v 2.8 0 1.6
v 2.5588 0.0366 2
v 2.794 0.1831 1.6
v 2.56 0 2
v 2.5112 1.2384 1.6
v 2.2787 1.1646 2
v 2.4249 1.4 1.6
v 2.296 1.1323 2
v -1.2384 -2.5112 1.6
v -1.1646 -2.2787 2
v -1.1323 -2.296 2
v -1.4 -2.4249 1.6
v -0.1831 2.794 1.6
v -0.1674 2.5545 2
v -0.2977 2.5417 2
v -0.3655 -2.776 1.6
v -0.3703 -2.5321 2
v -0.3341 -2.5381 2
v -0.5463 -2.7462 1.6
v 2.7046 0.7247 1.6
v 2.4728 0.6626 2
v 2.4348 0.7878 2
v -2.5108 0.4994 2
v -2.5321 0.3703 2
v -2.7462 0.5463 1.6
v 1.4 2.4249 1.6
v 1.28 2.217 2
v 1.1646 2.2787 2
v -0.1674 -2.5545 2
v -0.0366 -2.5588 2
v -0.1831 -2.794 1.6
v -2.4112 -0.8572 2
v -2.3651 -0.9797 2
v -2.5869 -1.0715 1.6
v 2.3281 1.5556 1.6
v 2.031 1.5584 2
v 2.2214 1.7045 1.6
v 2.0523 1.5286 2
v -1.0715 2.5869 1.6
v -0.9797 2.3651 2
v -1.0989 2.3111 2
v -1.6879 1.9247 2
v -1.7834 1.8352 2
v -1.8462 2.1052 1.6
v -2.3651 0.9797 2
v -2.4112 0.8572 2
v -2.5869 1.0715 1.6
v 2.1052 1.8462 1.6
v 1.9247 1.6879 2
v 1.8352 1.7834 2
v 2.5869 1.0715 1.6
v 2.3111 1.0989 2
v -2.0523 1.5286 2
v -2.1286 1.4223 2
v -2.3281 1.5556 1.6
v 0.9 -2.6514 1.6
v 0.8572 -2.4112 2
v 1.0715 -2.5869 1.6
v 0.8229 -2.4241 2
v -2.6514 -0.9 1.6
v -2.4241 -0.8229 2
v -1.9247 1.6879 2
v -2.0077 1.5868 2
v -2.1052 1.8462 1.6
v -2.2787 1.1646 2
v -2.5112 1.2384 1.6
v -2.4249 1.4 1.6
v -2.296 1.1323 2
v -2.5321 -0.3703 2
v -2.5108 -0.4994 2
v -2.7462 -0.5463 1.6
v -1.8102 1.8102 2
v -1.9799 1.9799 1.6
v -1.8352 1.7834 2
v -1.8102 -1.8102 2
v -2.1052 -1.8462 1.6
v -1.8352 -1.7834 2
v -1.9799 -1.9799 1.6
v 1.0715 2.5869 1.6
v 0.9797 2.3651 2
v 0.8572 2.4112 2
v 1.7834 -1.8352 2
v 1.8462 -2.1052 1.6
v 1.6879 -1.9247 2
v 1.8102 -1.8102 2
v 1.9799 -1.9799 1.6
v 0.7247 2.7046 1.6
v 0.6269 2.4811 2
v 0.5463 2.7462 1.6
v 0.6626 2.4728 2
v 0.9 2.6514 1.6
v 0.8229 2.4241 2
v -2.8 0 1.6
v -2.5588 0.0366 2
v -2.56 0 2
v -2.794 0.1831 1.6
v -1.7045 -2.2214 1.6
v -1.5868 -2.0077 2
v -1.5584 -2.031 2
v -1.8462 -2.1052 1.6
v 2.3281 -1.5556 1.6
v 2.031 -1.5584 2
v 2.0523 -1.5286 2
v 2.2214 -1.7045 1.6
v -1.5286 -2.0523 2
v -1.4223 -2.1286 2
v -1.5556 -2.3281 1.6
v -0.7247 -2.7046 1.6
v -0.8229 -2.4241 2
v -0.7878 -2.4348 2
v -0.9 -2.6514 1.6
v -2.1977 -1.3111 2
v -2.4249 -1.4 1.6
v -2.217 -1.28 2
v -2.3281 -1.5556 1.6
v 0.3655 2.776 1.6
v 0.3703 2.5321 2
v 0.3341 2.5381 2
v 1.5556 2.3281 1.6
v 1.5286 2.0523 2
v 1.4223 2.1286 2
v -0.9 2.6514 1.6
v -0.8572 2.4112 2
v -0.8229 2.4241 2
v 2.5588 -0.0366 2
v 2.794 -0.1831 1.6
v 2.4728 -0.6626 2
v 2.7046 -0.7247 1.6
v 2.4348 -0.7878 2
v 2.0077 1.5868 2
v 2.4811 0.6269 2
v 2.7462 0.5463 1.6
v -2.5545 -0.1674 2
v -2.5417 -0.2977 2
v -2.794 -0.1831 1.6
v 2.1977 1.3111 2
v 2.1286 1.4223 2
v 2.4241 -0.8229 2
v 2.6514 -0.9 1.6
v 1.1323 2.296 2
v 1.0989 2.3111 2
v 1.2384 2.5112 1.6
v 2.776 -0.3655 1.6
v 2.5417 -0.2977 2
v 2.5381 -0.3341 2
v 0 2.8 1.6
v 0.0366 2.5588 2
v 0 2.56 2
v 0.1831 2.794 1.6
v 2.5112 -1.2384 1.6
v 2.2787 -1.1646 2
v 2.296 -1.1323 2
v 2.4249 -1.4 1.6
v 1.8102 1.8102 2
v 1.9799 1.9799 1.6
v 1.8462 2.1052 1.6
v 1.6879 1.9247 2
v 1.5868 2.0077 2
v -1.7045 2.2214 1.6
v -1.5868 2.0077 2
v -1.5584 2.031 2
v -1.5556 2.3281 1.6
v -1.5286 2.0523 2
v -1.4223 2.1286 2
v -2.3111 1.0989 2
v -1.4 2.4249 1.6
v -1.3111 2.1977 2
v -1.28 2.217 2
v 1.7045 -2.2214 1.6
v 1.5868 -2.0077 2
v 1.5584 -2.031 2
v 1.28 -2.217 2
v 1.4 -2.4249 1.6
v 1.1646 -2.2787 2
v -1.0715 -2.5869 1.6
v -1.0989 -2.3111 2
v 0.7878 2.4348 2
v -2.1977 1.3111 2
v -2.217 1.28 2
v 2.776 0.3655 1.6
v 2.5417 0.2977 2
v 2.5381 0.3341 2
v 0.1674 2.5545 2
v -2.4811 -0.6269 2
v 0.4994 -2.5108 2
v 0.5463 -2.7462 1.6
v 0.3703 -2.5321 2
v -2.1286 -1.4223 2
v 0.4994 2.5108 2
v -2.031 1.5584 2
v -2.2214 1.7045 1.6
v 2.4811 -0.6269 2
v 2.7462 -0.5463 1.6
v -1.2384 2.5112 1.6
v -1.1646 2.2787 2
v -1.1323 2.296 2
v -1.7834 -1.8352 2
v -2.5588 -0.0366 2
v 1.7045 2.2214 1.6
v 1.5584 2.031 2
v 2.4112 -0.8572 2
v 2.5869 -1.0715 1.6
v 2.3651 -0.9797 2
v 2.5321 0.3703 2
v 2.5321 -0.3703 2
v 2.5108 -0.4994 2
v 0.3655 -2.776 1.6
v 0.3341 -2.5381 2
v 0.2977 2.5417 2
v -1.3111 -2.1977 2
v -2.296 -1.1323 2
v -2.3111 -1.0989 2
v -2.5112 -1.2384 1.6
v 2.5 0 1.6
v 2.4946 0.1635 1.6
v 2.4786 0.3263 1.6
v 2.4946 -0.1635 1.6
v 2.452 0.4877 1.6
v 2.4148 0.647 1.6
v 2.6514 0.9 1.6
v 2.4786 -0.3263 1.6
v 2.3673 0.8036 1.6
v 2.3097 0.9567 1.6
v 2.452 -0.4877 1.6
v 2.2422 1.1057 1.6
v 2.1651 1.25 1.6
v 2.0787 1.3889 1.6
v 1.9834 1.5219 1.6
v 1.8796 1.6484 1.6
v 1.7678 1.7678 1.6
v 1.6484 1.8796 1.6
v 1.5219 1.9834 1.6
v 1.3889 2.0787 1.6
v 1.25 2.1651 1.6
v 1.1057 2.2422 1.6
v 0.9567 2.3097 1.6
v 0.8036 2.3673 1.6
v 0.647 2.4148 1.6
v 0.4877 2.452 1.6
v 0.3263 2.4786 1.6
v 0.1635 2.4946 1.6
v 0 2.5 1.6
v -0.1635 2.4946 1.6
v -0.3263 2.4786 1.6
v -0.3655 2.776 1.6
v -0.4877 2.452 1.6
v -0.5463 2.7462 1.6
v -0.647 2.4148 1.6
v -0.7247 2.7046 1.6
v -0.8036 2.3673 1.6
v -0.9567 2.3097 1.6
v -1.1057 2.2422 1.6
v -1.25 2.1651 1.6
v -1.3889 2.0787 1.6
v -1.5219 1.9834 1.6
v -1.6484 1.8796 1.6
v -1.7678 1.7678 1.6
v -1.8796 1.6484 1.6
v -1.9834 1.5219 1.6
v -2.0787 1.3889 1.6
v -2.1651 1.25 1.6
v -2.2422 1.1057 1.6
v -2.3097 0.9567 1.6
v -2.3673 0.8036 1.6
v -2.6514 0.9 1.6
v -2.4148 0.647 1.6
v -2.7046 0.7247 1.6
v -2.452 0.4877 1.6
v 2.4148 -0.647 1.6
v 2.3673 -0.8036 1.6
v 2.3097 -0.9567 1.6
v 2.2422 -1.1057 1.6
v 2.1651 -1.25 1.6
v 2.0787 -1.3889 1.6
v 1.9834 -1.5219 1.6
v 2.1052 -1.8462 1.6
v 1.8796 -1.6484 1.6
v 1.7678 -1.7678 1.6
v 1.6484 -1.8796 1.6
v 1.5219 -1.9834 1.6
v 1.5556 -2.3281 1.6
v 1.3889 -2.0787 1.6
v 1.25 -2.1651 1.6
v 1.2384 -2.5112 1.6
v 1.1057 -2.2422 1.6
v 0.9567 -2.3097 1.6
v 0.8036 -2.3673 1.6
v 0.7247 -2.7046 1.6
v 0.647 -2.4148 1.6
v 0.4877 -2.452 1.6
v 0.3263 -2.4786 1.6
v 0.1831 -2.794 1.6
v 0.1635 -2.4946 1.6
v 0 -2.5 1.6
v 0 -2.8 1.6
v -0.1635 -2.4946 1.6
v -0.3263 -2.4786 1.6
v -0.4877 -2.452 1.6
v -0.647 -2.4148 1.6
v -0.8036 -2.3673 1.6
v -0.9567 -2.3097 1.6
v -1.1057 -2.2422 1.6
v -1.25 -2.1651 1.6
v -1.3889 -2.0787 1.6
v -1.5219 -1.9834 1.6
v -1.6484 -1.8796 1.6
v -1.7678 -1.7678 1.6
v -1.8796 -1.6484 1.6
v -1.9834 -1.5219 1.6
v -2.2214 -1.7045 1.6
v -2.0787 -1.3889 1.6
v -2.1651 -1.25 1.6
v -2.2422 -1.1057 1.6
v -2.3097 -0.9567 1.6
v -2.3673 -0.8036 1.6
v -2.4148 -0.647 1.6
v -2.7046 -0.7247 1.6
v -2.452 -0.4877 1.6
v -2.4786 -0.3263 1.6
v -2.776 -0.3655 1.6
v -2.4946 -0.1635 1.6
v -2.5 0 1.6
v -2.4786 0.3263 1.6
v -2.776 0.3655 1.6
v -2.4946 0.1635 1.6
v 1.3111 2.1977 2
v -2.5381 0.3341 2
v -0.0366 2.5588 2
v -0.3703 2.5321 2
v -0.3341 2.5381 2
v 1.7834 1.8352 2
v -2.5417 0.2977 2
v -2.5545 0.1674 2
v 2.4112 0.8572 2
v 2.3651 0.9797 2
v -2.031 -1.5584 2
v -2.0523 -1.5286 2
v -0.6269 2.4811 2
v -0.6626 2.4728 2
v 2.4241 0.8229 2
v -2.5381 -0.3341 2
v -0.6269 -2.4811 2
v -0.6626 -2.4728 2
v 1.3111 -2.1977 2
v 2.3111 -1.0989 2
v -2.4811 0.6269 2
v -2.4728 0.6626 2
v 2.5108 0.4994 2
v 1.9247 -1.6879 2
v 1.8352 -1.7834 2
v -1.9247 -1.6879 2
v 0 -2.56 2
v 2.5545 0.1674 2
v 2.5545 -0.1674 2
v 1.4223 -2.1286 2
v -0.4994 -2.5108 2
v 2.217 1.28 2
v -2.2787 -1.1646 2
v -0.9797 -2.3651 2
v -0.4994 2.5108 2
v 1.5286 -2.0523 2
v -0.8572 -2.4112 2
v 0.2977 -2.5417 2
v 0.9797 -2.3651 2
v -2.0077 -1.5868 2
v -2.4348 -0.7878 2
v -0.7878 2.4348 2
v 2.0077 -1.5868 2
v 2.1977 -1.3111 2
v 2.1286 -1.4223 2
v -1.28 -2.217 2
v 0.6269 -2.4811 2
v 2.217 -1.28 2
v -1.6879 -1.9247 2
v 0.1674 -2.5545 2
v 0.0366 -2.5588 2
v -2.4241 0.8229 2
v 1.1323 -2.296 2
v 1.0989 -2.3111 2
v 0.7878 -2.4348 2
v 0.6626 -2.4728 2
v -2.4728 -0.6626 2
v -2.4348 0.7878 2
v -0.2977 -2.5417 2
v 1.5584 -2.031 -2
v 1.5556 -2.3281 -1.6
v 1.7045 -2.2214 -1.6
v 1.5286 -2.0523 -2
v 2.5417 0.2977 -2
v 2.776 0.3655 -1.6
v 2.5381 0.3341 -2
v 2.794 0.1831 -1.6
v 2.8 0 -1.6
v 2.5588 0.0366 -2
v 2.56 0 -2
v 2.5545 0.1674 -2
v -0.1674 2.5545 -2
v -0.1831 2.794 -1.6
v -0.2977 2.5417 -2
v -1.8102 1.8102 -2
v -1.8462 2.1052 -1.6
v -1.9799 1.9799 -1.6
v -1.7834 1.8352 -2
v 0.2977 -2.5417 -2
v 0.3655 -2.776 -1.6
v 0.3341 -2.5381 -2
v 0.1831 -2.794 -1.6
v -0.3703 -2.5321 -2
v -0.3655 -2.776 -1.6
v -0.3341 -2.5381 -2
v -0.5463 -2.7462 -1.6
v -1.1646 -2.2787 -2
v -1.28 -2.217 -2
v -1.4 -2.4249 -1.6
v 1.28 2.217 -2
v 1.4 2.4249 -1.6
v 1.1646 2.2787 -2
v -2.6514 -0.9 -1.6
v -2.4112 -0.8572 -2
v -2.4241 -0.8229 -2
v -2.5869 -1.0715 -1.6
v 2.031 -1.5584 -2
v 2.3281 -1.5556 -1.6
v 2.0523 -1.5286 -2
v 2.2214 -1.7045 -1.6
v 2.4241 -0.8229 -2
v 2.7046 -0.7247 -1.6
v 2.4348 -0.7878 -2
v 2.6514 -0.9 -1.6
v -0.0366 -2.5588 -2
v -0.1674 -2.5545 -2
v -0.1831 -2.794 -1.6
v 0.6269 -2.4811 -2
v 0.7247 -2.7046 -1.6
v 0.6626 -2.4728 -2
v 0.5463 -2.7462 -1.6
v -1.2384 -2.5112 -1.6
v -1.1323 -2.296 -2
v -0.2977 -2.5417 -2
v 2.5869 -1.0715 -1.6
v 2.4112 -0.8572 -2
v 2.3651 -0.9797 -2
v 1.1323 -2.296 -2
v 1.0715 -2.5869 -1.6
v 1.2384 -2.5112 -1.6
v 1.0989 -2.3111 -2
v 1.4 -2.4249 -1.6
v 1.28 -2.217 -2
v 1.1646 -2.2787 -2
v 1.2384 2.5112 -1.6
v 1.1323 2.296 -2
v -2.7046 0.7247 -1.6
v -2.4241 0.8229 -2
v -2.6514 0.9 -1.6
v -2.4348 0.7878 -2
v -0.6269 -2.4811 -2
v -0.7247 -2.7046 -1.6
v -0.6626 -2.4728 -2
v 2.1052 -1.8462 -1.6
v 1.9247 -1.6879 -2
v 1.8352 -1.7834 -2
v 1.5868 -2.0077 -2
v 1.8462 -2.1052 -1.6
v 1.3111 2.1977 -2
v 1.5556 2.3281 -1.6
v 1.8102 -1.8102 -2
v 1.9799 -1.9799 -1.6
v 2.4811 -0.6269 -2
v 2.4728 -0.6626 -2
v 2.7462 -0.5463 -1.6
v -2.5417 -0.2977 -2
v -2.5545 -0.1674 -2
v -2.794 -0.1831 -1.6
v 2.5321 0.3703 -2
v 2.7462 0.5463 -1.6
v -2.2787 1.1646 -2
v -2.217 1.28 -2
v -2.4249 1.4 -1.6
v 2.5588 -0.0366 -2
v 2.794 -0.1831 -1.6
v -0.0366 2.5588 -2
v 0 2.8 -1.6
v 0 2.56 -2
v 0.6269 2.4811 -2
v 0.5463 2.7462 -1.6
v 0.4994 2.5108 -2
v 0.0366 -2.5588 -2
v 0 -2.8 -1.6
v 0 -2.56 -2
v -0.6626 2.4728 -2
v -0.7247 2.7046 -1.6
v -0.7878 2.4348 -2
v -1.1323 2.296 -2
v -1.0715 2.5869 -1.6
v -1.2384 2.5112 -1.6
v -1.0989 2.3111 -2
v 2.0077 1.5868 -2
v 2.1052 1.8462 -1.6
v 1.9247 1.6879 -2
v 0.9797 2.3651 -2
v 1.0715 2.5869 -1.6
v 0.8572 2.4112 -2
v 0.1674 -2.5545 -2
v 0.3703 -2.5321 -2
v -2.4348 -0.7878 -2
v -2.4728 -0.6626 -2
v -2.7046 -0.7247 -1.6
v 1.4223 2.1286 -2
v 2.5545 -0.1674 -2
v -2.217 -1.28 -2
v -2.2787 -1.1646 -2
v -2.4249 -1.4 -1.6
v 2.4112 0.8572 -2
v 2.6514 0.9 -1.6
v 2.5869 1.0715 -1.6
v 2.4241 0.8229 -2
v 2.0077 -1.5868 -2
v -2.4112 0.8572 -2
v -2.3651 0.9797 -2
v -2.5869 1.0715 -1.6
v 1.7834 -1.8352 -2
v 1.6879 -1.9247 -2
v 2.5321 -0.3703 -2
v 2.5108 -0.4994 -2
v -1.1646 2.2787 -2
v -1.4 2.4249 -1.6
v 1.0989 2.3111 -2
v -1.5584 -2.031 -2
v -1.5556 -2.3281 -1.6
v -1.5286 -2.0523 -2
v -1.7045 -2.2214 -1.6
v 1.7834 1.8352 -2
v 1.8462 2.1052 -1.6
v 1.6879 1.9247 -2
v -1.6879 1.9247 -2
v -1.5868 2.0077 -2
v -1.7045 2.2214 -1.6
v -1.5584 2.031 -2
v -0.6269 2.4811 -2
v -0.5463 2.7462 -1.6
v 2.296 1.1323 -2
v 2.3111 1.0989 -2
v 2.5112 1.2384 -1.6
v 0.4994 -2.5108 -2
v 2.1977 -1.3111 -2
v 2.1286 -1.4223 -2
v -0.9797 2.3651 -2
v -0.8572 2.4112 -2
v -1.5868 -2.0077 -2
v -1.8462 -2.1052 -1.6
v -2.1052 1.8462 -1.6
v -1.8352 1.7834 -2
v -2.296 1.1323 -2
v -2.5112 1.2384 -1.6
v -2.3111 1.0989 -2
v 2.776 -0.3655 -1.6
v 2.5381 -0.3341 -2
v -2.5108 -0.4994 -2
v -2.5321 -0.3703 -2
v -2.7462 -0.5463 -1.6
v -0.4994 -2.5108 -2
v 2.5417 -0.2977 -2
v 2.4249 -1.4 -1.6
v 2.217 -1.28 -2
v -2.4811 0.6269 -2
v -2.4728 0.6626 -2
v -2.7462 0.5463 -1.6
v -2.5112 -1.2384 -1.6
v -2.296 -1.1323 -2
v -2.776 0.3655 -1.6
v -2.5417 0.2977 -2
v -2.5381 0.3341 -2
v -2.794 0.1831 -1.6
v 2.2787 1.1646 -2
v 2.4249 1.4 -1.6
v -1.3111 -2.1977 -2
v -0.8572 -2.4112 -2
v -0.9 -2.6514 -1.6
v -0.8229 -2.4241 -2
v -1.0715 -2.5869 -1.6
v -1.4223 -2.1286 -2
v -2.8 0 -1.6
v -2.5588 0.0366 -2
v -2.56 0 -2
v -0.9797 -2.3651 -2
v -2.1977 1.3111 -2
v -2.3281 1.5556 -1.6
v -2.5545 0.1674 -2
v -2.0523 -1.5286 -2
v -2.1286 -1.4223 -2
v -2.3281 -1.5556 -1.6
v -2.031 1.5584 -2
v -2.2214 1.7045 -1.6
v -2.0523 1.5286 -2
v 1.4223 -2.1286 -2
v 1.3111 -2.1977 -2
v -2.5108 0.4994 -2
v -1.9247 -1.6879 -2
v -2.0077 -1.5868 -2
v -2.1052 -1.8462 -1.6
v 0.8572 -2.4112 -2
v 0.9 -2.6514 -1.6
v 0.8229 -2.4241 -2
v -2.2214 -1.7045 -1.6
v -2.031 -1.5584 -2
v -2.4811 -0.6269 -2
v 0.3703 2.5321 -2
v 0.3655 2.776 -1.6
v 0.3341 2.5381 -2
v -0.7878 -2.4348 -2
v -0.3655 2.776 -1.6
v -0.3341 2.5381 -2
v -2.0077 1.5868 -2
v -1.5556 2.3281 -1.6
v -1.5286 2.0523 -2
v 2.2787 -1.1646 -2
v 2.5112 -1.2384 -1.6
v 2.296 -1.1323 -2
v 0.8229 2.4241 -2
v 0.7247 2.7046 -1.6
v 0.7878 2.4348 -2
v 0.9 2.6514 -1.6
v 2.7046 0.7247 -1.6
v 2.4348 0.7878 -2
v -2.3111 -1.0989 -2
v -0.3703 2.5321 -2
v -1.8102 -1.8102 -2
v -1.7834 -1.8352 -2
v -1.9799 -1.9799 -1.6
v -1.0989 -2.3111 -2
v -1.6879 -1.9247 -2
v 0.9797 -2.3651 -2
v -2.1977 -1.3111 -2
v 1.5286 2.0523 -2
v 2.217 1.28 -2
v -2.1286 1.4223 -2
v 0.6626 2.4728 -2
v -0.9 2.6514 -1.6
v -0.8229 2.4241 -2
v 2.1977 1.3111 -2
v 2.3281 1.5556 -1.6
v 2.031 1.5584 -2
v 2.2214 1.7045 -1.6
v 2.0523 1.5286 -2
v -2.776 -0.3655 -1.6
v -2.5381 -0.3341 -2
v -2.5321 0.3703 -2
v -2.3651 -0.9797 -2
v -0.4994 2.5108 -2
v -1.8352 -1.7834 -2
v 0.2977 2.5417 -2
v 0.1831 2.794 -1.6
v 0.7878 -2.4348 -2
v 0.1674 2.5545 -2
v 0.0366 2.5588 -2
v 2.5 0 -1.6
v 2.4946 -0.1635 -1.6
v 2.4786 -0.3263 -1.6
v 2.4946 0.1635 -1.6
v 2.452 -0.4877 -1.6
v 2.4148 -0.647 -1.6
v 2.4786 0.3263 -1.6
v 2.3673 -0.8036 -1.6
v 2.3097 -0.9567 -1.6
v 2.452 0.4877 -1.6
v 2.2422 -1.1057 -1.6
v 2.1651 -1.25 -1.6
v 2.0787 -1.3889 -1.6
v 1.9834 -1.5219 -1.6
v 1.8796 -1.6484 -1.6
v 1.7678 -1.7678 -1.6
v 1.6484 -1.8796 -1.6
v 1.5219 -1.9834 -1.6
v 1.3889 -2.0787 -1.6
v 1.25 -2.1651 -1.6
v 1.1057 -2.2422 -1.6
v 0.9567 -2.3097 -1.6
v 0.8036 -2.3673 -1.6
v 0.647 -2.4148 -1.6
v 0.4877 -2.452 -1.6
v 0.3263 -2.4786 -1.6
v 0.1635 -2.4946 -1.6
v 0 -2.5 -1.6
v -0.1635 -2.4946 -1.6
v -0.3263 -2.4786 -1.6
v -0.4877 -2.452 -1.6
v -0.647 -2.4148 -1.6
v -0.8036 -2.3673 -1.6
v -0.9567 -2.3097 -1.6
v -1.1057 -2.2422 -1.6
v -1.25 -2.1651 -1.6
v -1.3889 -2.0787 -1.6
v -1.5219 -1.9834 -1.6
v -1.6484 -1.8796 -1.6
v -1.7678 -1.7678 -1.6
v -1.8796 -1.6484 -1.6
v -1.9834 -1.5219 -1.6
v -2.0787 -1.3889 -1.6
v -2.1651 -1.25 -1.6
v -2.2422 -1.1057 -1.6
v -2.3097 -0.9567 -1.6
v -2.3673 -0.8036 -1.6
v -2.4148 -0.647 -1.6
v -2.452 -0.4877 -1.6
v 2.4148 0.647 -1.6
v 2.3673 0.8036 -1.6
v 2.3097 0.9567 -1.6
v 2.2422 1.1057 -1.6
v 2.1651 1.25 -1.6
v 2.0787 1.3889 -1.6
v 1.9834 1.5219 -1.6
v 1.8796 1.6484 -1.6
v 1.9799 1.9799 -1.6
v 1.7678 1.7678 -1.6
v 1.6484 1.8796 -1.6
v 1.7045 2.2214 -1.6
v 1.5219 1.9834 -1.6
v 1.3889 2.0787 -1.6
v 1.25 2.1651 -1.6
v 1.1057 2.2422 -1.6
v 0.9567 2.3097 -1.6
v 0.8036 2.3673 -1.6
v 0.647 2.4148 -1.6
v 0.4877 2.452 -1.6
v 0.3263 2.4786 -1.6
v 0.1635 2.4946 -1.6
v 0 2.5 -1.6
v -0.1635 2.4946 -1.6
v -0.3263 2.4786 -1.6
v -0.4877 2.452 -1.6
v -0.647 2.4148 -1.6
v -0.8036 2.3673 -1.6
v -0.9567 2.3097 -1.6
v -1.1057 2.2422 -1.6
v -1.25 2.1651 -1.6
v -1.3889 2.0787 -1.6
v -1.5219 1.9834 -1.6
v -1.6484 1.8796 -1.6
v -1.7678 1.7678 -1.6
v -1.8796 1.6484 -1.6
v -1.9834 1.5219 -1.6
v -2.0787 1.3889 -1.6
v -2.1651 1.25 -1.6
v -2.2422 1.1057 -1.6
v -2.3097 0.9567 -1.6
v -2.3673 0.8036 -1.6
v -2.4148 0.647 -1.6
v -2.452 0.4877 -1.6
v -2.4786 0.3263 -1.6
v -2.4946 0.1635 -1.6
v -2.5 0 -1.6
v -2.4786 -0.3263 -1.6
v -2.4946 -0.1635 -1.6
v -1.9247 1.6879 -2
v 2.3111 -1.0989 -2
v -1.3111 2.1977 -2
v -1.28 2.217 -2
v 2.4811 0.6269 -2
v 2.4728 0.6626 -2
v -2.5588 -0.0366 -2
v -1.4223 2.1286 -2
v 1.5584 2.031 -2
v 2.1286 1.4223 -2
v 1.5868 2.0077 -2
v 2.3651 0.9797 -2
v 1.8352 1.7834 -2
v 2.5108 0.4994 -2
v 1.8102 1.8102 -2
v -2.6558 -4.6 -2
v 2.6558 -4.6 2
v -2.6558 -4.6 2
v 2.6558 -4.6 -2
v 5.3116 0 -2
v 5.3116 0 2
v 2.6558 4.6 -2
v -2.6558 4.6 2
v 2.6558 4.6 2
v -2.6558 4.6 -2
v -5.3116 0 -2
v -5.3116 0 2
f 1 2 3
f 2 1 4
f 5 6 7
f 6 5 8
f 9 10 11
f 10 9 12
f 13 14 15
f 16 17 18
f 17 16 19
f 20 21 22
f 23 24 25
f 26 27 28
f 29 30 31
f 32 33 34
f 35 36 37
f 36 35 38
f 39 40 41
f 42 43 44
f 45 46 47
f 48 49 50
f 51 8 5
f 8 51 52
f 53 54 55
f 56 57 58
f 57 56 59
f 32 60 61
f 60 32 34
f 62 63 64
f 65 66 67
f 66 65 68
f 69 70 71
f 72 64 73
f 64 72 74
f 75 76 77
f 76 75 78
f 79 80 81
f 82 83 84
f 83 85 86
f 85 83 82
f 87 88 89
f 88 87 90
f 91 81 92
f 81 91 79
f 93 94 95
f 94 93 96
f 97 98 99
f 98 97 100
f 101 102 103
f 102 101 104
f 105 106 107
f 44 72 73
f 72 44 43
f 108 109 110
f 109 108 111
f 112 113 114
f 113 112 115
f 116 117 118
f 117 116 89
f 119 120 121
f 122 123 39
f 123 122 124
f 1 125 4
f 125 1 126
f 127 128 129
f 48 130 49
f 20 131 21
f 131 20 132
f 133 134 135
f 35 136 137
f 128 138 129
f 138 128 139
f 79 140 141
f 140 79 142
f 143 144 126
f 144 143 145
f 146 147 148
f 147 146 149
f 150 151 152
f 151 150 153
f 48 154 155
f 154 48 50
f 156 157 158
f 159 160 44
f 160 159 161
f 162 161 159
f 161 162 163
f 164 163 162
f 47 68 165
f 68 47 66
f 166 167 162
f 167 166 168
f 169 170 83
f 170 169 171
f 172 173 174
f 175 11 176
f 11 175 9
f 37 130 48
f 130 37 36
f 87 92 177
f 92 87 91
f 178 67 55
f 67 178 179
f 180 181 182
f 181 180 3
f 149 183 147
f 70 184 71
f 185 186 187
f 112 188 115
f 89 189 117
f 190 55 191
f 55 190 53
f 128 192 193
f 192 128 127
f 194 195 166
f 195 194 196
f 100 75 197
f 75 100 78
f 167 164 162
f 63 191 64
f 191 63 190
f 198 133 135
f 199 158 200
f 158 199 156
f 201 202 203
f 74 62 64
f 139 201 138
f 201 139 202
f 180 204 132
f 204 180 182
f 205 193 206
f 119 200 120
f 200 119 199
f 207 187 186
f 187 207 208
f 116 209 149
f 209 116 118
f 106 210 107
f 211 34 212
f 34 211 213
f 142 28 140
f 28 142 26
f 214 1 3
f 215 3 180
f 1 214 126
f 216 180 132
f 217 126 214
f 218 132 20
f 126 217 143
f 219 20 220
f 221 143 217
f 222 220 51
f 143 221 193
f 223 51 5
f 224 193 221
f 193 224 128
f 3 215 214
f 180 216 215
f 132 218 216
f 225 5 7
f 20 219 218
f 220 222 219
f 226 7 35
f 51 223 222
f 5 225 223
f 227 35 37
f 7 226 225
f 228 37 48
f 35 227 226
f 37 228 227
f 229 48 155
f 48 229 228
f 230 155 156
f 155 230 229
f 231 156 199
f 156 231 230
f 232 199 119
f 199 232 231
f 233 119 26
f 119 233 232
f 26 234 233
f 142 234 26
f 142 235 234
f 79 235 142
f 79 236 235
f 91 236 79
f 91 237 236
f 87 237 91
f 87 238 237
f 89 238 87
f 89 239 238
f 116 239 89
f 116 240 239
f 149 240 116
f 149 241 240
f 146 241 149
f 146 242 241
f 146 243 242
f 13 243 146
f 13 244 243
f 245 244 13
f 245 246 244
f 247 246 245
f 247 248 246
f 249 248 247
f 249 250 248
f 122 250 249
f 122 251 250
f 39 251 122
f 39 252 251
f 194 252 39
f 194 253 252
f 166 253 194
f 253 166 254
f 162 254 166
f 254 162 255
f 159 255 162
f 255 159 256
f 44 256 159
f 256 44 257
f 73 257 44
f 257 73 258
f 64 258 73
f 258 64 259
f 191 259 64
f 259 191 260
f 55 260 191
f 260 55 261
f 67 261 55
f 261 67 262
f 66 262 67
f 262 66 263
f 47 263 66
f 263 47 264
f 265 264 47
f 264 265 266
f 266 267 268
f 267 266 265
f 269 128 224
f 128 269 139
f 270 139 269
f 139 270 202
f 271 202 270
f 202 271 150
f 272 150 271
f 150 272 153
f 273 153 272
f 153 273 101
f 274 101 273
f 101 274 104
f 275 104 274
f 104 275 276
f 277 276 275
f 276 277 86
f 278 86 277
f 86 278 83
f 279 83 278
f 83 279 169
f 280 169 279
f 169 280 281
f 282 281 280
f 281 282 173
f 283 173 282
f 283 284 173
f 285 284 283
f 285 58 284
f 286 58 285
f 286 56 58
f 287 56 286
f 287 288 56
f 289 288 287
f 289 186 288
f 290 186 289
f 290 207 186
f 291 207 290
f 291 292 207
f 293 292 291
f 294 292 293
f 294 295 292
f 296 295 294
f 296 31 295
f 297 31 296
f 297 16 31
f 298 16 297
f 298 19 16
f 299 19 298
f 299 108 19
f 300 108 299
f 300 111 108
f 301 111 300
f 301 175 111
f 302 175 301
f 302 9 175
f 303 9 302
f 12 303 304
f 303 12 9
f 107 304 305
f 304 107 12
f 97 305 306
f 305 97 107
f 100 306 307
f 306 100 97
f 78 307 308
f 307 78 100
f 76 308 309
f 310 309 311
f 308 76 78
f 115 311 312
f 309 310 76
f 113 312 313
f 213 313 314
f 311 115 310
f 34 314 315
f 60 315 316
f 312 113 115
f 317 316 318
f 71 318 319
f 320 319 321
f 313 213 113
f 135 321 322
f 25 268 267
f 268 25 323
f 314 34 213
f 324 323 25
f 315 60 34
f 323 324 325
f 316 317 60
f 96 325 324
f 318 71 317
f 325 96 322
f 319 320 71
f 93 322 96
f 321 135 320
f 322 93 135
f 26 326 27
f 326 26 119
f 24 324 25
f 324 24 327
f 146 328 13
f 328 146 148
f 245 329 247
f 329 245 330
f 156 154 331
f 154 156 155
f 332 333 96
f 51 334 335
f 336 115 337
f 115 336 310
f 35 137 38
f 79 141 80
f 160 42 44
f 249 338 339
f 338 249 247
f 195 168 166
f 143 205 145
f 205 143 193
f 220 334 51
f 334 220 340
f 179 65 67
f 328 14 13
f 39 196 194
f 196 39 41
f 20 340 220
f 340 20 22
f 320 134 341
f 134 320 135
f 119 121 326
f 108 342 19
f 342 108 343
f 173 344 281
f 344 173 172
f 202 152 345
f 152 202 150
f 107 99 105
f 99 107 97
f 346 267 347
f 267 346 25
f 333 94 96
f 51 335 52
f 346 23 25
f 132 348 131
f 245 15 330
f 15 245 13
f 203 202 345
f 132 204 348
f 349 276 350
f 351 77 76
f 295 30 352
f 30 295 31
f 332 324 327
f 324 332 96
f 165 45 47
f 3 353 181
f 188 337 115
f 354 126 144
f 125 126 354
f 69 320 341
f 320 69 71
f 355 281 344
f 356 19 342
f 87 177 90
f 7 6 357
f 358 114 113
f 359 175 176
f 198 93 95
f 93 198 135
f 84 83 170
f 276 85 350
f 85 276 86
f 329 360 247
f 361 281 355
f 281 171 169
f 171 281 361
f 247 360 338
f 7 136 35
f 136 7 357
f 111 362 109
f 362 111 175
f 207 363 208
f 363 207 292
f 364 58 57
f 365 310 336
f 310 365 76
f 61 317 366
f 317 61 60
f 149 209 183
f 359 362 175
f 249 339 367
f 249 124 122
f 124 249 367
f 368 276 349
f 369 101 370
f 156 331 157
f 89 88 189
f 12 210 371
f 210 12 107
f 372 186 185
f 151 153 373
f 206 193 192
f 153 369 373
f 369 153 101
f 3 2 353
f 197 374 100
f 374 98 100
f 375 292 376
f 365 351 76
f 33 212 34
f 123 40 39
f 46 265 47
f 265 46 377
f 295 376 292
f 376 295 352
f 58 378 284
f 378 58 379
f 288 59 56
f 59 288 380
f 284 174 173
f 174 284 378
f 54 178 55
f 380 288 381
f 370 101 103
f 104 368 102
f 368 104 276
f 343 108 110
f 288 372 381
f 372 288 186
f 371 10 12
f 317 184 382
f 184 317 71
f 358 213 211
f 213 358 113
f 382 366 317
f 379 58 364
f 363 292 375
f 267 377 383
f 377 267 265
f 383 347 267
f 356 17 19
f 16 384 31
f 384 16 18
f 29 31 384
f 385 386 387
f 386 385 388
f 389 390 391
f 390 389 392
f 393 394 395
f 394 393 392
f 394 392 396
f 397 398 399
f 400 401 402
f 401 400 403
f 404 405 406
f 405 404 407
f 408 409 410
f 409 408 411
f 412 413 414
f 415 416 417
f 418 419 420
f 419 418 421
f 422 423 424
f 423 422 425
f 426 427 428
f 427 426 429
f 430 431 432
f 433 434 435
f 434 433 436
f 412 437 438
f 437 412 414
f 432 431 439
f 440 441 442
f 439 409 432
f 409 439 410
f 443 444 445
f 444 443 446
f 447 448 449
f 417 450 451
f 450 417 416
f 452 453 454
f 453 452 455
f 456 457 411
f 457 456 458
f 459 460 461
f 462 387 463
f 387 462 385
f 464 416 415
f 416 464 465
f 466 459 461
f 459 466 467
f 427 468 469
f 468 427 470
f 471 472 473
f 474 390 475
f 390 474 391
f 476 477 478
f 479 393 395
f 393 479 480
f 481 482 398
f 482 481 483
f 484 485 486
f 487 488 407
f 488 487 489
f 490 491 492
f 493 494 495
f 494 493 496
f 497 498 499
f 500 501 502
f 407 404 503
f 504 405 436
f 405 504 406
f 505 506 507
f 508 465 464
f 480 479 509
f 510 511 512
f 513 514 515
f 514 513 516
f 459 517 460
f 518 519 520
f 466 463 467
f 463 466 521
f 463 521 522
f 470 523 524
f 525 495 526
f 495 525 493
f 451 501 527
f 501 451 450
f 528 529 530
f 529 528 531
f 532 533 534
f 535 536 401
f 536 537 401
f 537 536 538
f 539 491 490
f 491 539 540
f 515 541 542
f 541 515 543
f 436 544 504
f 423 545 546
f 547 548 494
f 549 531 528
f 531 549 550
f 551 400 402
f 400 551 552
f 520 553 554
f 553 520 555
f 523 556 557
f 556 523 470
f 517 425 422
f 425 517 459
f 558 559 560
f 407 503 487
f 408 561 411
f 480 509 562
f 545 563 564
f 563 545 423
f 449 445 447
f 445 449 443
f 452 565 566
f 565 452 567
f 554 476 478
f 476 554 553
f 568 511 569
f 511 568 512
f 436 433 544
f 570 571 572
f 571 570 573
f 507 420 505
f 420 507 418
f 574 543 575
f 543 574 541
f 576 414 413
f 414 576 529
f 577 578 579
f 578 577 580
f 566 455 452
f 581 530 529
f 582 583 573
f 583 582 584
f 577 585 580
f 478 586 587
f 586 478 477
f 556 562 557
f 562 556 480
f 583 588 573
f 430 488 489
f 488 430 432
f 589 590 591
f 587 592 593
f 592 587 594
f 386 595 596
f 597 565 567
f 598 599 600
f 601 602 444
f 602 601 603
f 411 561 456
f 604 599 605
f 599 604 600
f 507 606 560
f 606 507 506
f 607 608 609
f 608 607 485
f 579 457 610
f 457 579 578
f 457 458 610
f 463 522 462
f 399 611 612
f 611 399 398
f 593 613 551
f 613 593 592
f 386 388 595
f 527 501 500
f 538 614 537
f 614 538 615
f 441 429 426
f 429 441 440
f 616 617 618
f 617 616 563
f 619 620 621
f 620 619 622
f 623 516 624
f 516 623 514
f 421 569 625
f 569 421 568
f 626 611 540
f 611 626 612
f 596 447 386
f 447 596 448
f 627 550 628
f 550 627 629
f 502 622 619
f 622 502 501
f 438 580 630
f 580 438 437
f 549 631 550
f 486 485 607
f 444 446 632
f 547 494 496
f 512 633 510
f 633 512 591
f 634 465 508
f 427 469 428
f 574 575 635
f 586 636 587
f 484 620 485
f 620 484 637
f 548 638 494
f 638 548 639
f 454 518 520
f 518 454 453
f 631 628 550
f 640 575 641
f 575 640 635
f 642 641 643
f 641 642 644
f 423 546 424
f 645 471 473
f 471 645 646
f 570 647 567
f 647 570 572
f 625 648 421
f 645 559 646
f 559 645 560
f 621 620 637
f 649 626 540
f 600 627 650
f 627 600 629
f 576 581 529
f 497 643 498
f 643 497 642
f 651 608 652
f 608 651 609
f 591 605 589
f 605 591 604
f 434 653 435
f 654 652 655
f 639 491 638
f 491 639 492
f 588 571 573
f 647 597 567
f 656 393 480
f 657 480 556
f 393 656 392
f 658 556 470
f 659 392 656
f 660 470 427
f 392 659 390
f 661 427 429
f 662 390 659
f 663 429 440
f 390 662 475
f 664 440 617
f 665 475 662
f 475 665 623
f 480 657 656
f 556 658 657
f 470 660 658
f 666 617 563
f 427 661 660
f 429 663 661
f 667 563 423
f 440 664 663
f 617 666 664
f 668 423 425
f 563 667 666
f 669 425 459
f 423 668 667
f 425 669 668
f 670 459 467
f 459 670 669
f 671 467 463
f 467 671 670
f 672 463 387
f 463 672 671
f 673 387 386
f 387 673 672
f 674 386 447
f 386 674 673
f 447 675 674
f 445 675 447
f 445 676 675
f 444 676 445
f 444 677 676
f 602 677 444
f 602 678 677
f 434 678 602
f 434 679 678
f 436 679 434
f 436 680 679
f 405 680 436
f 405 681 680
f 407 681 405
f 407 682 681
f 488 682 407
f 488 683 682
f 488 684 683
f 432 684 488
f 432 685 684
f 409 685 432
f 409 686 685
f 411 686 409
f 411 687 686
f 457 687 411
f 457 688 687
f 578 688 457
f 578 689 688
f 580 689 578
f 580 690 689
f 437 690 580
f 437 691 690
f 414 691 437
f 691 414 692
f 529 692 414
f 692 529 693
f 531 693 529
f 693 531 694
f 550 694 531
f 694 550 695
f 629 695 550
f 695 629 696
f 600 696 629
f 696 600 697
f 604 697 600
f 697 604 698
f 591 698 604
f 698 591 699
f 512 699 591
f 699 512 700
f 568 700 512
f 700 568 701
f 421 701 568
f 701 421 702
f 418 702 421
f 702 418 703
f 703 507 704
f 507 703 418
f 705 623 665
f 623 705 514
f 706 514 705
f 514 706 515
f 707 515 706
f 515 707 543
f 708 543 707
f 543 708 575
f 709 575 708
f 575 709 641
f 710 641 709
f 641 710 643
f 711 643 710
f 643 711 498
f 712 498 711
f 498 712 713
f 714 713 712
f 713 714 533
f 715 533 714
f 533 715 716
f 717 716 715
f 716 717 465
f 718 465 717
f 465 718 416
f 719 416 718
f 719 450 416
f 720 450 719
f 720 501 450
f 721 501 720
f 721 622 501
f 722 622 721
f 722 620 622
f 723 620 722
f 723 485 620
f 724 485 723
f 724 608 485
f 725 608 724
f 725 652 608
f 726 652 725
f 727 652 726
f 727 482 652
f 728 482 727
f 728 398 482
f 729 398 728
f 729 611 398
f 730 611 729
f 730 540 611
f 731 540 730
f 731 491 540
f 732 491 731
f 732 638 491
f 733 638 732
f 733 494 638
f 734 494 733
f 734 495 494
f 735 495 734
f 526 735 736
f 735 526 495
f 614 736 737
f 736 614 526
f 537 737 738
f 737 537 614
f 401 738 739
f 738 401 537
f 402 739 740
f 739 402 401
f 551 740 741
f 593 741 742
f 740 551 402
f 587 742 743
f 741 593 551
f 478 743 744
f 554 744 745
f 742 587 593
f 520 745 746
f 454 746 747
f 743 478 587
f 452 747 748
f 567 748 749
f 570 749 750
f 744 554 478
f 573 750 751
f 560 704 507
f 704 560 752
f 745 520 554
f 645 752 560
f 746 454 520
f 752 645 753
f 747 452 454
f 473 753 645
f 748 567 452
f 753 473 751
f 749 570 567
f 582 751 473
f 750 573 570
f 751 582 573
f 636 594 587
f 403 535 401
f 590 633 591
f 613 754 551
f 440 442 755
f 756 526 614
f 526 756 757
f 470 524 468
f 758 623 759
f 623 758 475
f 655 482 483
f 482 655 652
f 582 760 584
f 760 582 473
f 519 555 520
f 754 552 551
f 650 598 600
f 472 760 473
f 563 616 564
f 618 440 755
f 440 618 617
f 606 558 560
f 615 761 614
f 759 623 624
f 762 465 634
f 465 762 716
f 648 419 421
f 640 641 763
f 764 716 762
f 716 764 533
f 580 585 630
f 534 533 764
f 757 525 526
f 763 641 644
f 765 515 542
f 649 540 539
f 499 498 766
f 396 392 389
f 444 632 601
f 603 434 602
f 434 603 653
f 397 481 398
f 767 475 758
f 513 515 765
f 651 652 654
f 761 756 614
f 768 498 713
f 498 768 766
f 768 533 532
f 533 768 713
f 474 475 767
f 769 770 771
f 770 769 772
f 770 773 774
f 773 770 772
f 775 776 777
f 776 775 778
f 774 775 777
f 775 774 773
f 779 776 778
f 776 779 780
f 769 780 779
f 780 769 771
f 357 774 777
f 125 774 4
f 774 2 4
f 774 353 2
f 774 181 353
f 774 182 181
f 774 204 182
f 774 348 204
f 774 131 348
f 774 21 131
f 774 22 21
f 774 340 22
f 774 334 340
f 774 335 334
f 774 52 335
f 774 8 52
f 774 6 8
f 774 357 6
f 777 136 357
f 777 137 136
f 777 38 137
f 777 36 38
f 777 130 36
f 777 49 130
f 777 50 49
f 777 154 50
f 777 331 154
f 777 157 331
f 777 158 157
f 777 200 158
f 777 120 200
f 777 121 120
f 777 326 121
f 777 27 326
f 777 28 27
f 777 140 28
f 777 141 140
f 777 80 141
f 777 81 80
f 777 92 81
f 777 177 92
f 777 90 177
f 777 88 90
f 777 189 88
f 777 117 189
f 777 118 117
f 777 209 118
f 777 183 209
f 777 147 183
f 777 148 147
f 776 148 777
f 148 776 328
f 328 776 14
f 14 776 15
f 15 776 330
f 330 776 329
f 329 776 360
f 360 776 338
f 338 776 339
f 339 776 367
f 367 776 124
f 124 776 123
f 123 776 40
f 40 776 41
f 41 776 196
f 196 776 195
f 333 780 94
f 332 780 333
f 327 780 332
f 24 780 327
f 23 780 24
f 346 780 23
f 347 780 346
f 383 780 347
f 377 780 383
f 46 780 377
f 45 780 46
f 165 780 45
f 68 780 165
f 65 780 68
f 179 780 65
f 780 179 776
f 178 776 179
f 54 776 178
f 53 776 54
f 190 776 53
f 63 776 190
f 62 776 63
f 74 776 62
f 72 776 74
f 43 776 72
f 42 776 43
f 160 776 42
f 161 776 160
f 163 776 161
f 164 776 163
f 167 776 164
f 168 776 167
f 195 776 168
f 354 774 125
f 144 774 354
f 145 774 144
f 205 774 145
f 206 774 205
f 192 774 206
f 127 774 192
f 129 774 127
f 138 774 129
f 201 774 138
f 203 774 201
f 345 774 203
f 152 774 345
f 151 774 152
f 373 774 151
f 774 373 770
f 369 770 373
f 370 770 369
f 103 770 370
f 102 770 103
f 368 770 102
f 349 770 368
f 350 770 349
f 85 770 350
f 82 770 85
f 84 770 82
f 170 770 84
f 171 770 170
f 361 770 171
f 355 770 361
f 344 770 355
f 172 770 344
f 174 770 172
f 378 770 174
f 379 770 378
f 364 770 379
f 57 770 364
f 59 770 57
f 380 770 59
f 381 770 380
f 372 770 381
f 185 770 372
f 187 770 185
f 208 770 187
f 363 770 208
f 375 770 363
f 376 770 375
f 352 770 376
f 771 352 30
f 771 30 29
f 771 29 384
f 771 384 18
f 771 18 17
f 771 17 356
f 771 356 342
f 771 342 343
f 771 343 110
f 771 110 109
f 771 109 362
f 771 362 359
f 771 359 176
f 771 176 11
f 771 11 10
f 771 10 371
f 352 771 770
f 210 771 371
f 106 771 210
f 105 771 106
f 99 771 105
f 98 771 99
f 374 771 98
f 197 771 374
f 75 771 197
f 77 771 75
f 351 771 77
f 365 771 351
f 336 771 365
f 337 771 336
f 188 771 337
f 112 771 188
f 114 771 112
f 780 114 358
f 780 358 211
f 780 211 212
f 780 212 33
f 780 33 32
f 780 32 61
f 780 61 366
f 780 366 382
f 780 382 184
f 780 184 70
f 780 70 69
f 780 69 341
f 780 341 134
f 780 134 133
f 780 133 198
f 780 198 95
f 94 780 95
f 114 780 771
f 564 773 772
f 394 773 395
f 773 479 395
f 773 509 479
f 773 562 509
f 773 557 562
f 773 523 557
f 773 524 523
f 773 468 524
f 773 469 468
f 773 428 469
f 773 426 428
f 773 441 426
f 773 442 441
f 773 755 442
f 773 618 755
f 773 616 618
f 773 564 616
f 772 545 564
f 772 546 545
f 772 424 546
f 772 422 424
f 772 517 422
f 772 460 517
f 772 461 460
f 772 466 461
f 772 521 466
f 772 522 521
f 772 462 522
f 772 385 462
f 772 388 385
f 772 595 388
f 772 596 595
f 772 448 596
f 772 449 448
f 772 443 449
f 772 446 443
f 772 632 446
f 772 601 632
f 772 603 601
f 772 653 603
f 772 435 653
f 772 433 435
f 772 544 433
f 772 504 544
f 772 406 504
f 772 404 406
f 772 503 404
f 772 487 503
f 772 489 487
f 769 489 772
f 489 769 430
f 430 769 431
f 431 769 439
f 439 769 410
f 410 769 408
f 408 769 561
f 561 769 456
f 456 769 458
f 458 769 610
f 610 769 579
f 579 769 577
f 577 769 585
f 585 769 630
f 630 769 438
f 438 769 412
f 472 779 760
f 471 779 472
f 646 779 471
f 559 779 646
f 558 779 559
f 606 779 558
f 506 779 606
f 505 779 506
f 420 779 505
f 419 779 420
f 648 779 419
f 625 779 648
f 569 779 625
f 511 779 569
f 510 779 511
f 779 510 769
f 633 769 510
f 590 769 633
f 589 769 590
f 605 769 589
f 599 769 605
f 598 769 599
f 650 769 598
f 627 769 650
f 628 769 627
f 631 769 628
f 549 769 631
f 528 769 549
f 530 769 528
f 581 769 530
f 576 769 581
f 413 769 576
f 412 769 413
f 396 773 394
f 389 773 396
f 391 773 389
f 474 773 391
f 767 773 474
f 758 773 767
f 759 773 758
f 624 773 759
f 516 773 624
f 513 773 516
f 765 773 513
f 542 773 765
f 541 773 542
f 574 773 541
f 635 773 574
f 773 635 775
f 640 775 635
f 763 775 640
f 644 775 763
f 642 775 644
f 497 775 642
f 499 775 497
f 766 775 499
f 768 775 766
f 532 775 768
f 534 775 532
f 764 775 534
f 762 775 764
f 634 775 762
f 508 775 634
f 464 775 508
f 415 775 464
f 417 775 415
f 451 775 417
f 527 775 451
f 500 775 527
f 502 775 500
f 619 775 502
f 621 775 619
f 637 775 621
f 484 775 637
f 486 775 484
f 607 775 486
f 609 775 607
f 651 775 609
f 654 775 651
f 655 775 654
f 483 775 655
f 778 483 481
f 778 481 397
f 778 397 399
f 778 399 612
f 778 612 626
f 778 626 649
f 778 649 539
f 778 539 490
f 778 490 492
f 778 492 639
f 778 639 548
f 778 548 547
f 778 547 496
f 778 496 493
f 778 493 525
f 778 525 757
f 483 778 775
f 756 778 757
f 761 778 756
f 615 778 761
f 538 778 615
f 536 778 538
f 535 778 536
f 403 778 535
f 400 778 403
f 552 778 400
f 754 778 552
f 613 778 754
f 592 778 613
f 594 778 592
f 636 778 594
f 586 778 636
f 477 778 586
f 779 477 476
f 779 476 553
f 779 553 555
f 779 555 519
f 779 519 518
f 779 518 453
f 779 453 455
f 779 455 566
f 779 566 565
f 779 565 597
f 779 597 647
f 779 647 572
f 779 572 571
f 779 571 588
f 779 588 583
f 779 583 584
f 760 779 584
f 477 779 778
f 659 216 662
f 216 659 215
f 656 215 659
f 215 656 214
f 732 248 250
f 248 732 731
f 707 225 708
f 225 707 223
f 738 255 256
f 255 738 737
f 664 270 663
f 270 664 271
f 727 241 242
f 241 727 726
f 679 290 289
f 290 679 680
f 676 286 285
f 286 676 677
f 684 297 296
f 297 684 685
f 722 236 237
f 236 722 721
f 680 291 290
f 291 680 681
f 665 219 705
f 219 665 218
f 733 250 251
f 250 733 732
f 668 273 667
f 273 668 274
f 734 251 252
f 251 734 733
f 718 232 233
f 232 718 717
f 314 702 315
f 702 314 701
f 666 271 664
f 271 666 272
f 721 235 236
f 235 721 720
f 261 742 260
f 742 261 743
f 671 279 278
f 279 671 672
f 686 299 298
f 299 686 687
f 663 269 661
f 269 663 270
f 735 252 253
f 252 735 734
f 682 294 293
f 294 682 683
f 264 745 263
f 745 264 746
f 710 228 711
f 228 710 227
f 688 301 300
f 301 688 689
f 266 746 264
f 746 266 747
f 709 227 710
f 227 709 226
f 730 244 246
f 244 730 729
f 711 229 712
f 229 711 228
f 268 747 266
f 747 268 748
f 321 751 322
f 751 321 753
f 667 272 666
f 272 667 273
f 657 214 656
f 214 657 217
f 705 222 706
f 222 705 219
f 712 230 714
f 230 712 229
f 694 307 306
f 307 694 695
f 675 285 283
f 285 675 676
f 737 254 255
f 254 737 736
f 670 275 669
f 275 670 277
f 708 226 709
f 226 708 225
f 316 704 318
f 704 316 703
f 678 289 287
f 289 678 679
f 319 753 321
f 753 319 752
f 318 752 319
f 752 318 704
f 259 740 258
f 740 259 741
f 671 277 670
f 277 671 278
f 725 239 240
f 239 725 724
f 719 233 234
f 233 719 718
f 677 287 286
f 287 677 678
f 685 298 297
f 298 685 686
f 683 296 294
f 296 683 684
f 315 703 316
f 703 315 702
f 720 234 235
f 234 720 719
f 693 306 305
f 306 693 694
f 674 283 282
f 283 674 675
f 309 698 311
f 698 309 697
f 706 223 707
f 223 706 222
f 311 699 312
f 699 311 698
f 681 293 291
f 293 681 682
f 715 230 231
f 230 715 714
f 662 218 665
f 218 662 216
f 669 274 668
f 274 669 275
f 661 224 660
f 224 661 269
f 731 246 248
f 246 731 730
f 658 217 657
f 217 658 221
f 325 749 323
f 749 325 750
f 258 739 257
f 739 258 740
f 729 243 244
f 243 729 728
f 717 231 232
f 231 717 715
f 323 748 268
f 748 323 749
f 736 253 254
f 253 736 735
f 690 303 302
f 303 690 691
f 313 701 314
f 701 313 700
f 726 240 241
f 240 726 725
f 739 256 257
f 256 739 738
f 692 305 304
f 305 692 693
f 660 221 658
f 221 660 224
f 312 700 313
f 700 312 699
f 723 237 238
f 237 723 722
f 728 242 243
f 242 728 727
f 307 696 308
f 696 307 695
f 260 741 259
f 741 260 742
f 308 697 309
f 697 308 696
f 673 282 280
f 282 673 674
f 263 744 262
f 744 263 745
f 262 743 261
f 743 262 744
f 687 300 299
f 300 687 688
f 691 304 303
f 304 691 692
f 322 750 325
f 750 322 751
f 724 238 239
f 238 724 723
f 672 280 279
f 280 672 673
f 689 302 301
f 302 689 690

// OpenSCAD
// Hex nut: 5.0mm screw, 9.2mm across flats, 4.0mm thick
// One connected solid (nut only)

// Parameters (fixed to requested dimensions)
thread_nominal_diameter_mm = 5.0;
across_flats_mm            = 9.2;
thickness_mm               = 4.0;

// Practical modeling parameters
hole_diameter_mm = thread_nominal_diameter_mm; // simple through-hole representation
edge_chamfer_mm  = 0.3;                        // small edge break on hole
overcut_mm       = 0.2;                        // ensures clean boolean cuts
$fn = 96;

module hex_nut(af, h, hole_d, chamfer) {
    // For a hex made with cylinder($fn=6), r is circumradius.
    // Across flats = 2 * r * cos(30deg)  => r = af / (2*cos(30))
    hex_r = af / (2 * cos(30));

    difference() {
        // Nut body
        cylinder(r=hex_r, h=h, center=true, $fn=6);

        // Through hole
        cylinder(d=hole_d, h=h + 2*overcut_mm, center=true, $fn=96);

        // Hole chamfers (top and bottom), kept within nut thickness
        chamfer_h = min(chamfer, h/2 - 0.01);

        if (chamfer_h > 0) {
            // Top chamfer
            translate([0, 0,  h/2 - chamfer_h/2])
                cylinder(d1=hole_d + 2*chamfer_h, d2=hole_d,
                         h=chamfer_h + overcut_mm, center=true, $fn=96);

            // Bottom chamfer
            translate([0, 0, -h/2 + chamfer_h/2])
                cylinder(d1=hole_d, d2=hole_d + 2*chamfer_h,
                         h=chamfer_h + overcut_mm, center=true, $fn=96);
        }
    }
}

hex_nut(across_flats_mm, thickness_mm, hole_diameter_mm, edge_chamfer_mm);
